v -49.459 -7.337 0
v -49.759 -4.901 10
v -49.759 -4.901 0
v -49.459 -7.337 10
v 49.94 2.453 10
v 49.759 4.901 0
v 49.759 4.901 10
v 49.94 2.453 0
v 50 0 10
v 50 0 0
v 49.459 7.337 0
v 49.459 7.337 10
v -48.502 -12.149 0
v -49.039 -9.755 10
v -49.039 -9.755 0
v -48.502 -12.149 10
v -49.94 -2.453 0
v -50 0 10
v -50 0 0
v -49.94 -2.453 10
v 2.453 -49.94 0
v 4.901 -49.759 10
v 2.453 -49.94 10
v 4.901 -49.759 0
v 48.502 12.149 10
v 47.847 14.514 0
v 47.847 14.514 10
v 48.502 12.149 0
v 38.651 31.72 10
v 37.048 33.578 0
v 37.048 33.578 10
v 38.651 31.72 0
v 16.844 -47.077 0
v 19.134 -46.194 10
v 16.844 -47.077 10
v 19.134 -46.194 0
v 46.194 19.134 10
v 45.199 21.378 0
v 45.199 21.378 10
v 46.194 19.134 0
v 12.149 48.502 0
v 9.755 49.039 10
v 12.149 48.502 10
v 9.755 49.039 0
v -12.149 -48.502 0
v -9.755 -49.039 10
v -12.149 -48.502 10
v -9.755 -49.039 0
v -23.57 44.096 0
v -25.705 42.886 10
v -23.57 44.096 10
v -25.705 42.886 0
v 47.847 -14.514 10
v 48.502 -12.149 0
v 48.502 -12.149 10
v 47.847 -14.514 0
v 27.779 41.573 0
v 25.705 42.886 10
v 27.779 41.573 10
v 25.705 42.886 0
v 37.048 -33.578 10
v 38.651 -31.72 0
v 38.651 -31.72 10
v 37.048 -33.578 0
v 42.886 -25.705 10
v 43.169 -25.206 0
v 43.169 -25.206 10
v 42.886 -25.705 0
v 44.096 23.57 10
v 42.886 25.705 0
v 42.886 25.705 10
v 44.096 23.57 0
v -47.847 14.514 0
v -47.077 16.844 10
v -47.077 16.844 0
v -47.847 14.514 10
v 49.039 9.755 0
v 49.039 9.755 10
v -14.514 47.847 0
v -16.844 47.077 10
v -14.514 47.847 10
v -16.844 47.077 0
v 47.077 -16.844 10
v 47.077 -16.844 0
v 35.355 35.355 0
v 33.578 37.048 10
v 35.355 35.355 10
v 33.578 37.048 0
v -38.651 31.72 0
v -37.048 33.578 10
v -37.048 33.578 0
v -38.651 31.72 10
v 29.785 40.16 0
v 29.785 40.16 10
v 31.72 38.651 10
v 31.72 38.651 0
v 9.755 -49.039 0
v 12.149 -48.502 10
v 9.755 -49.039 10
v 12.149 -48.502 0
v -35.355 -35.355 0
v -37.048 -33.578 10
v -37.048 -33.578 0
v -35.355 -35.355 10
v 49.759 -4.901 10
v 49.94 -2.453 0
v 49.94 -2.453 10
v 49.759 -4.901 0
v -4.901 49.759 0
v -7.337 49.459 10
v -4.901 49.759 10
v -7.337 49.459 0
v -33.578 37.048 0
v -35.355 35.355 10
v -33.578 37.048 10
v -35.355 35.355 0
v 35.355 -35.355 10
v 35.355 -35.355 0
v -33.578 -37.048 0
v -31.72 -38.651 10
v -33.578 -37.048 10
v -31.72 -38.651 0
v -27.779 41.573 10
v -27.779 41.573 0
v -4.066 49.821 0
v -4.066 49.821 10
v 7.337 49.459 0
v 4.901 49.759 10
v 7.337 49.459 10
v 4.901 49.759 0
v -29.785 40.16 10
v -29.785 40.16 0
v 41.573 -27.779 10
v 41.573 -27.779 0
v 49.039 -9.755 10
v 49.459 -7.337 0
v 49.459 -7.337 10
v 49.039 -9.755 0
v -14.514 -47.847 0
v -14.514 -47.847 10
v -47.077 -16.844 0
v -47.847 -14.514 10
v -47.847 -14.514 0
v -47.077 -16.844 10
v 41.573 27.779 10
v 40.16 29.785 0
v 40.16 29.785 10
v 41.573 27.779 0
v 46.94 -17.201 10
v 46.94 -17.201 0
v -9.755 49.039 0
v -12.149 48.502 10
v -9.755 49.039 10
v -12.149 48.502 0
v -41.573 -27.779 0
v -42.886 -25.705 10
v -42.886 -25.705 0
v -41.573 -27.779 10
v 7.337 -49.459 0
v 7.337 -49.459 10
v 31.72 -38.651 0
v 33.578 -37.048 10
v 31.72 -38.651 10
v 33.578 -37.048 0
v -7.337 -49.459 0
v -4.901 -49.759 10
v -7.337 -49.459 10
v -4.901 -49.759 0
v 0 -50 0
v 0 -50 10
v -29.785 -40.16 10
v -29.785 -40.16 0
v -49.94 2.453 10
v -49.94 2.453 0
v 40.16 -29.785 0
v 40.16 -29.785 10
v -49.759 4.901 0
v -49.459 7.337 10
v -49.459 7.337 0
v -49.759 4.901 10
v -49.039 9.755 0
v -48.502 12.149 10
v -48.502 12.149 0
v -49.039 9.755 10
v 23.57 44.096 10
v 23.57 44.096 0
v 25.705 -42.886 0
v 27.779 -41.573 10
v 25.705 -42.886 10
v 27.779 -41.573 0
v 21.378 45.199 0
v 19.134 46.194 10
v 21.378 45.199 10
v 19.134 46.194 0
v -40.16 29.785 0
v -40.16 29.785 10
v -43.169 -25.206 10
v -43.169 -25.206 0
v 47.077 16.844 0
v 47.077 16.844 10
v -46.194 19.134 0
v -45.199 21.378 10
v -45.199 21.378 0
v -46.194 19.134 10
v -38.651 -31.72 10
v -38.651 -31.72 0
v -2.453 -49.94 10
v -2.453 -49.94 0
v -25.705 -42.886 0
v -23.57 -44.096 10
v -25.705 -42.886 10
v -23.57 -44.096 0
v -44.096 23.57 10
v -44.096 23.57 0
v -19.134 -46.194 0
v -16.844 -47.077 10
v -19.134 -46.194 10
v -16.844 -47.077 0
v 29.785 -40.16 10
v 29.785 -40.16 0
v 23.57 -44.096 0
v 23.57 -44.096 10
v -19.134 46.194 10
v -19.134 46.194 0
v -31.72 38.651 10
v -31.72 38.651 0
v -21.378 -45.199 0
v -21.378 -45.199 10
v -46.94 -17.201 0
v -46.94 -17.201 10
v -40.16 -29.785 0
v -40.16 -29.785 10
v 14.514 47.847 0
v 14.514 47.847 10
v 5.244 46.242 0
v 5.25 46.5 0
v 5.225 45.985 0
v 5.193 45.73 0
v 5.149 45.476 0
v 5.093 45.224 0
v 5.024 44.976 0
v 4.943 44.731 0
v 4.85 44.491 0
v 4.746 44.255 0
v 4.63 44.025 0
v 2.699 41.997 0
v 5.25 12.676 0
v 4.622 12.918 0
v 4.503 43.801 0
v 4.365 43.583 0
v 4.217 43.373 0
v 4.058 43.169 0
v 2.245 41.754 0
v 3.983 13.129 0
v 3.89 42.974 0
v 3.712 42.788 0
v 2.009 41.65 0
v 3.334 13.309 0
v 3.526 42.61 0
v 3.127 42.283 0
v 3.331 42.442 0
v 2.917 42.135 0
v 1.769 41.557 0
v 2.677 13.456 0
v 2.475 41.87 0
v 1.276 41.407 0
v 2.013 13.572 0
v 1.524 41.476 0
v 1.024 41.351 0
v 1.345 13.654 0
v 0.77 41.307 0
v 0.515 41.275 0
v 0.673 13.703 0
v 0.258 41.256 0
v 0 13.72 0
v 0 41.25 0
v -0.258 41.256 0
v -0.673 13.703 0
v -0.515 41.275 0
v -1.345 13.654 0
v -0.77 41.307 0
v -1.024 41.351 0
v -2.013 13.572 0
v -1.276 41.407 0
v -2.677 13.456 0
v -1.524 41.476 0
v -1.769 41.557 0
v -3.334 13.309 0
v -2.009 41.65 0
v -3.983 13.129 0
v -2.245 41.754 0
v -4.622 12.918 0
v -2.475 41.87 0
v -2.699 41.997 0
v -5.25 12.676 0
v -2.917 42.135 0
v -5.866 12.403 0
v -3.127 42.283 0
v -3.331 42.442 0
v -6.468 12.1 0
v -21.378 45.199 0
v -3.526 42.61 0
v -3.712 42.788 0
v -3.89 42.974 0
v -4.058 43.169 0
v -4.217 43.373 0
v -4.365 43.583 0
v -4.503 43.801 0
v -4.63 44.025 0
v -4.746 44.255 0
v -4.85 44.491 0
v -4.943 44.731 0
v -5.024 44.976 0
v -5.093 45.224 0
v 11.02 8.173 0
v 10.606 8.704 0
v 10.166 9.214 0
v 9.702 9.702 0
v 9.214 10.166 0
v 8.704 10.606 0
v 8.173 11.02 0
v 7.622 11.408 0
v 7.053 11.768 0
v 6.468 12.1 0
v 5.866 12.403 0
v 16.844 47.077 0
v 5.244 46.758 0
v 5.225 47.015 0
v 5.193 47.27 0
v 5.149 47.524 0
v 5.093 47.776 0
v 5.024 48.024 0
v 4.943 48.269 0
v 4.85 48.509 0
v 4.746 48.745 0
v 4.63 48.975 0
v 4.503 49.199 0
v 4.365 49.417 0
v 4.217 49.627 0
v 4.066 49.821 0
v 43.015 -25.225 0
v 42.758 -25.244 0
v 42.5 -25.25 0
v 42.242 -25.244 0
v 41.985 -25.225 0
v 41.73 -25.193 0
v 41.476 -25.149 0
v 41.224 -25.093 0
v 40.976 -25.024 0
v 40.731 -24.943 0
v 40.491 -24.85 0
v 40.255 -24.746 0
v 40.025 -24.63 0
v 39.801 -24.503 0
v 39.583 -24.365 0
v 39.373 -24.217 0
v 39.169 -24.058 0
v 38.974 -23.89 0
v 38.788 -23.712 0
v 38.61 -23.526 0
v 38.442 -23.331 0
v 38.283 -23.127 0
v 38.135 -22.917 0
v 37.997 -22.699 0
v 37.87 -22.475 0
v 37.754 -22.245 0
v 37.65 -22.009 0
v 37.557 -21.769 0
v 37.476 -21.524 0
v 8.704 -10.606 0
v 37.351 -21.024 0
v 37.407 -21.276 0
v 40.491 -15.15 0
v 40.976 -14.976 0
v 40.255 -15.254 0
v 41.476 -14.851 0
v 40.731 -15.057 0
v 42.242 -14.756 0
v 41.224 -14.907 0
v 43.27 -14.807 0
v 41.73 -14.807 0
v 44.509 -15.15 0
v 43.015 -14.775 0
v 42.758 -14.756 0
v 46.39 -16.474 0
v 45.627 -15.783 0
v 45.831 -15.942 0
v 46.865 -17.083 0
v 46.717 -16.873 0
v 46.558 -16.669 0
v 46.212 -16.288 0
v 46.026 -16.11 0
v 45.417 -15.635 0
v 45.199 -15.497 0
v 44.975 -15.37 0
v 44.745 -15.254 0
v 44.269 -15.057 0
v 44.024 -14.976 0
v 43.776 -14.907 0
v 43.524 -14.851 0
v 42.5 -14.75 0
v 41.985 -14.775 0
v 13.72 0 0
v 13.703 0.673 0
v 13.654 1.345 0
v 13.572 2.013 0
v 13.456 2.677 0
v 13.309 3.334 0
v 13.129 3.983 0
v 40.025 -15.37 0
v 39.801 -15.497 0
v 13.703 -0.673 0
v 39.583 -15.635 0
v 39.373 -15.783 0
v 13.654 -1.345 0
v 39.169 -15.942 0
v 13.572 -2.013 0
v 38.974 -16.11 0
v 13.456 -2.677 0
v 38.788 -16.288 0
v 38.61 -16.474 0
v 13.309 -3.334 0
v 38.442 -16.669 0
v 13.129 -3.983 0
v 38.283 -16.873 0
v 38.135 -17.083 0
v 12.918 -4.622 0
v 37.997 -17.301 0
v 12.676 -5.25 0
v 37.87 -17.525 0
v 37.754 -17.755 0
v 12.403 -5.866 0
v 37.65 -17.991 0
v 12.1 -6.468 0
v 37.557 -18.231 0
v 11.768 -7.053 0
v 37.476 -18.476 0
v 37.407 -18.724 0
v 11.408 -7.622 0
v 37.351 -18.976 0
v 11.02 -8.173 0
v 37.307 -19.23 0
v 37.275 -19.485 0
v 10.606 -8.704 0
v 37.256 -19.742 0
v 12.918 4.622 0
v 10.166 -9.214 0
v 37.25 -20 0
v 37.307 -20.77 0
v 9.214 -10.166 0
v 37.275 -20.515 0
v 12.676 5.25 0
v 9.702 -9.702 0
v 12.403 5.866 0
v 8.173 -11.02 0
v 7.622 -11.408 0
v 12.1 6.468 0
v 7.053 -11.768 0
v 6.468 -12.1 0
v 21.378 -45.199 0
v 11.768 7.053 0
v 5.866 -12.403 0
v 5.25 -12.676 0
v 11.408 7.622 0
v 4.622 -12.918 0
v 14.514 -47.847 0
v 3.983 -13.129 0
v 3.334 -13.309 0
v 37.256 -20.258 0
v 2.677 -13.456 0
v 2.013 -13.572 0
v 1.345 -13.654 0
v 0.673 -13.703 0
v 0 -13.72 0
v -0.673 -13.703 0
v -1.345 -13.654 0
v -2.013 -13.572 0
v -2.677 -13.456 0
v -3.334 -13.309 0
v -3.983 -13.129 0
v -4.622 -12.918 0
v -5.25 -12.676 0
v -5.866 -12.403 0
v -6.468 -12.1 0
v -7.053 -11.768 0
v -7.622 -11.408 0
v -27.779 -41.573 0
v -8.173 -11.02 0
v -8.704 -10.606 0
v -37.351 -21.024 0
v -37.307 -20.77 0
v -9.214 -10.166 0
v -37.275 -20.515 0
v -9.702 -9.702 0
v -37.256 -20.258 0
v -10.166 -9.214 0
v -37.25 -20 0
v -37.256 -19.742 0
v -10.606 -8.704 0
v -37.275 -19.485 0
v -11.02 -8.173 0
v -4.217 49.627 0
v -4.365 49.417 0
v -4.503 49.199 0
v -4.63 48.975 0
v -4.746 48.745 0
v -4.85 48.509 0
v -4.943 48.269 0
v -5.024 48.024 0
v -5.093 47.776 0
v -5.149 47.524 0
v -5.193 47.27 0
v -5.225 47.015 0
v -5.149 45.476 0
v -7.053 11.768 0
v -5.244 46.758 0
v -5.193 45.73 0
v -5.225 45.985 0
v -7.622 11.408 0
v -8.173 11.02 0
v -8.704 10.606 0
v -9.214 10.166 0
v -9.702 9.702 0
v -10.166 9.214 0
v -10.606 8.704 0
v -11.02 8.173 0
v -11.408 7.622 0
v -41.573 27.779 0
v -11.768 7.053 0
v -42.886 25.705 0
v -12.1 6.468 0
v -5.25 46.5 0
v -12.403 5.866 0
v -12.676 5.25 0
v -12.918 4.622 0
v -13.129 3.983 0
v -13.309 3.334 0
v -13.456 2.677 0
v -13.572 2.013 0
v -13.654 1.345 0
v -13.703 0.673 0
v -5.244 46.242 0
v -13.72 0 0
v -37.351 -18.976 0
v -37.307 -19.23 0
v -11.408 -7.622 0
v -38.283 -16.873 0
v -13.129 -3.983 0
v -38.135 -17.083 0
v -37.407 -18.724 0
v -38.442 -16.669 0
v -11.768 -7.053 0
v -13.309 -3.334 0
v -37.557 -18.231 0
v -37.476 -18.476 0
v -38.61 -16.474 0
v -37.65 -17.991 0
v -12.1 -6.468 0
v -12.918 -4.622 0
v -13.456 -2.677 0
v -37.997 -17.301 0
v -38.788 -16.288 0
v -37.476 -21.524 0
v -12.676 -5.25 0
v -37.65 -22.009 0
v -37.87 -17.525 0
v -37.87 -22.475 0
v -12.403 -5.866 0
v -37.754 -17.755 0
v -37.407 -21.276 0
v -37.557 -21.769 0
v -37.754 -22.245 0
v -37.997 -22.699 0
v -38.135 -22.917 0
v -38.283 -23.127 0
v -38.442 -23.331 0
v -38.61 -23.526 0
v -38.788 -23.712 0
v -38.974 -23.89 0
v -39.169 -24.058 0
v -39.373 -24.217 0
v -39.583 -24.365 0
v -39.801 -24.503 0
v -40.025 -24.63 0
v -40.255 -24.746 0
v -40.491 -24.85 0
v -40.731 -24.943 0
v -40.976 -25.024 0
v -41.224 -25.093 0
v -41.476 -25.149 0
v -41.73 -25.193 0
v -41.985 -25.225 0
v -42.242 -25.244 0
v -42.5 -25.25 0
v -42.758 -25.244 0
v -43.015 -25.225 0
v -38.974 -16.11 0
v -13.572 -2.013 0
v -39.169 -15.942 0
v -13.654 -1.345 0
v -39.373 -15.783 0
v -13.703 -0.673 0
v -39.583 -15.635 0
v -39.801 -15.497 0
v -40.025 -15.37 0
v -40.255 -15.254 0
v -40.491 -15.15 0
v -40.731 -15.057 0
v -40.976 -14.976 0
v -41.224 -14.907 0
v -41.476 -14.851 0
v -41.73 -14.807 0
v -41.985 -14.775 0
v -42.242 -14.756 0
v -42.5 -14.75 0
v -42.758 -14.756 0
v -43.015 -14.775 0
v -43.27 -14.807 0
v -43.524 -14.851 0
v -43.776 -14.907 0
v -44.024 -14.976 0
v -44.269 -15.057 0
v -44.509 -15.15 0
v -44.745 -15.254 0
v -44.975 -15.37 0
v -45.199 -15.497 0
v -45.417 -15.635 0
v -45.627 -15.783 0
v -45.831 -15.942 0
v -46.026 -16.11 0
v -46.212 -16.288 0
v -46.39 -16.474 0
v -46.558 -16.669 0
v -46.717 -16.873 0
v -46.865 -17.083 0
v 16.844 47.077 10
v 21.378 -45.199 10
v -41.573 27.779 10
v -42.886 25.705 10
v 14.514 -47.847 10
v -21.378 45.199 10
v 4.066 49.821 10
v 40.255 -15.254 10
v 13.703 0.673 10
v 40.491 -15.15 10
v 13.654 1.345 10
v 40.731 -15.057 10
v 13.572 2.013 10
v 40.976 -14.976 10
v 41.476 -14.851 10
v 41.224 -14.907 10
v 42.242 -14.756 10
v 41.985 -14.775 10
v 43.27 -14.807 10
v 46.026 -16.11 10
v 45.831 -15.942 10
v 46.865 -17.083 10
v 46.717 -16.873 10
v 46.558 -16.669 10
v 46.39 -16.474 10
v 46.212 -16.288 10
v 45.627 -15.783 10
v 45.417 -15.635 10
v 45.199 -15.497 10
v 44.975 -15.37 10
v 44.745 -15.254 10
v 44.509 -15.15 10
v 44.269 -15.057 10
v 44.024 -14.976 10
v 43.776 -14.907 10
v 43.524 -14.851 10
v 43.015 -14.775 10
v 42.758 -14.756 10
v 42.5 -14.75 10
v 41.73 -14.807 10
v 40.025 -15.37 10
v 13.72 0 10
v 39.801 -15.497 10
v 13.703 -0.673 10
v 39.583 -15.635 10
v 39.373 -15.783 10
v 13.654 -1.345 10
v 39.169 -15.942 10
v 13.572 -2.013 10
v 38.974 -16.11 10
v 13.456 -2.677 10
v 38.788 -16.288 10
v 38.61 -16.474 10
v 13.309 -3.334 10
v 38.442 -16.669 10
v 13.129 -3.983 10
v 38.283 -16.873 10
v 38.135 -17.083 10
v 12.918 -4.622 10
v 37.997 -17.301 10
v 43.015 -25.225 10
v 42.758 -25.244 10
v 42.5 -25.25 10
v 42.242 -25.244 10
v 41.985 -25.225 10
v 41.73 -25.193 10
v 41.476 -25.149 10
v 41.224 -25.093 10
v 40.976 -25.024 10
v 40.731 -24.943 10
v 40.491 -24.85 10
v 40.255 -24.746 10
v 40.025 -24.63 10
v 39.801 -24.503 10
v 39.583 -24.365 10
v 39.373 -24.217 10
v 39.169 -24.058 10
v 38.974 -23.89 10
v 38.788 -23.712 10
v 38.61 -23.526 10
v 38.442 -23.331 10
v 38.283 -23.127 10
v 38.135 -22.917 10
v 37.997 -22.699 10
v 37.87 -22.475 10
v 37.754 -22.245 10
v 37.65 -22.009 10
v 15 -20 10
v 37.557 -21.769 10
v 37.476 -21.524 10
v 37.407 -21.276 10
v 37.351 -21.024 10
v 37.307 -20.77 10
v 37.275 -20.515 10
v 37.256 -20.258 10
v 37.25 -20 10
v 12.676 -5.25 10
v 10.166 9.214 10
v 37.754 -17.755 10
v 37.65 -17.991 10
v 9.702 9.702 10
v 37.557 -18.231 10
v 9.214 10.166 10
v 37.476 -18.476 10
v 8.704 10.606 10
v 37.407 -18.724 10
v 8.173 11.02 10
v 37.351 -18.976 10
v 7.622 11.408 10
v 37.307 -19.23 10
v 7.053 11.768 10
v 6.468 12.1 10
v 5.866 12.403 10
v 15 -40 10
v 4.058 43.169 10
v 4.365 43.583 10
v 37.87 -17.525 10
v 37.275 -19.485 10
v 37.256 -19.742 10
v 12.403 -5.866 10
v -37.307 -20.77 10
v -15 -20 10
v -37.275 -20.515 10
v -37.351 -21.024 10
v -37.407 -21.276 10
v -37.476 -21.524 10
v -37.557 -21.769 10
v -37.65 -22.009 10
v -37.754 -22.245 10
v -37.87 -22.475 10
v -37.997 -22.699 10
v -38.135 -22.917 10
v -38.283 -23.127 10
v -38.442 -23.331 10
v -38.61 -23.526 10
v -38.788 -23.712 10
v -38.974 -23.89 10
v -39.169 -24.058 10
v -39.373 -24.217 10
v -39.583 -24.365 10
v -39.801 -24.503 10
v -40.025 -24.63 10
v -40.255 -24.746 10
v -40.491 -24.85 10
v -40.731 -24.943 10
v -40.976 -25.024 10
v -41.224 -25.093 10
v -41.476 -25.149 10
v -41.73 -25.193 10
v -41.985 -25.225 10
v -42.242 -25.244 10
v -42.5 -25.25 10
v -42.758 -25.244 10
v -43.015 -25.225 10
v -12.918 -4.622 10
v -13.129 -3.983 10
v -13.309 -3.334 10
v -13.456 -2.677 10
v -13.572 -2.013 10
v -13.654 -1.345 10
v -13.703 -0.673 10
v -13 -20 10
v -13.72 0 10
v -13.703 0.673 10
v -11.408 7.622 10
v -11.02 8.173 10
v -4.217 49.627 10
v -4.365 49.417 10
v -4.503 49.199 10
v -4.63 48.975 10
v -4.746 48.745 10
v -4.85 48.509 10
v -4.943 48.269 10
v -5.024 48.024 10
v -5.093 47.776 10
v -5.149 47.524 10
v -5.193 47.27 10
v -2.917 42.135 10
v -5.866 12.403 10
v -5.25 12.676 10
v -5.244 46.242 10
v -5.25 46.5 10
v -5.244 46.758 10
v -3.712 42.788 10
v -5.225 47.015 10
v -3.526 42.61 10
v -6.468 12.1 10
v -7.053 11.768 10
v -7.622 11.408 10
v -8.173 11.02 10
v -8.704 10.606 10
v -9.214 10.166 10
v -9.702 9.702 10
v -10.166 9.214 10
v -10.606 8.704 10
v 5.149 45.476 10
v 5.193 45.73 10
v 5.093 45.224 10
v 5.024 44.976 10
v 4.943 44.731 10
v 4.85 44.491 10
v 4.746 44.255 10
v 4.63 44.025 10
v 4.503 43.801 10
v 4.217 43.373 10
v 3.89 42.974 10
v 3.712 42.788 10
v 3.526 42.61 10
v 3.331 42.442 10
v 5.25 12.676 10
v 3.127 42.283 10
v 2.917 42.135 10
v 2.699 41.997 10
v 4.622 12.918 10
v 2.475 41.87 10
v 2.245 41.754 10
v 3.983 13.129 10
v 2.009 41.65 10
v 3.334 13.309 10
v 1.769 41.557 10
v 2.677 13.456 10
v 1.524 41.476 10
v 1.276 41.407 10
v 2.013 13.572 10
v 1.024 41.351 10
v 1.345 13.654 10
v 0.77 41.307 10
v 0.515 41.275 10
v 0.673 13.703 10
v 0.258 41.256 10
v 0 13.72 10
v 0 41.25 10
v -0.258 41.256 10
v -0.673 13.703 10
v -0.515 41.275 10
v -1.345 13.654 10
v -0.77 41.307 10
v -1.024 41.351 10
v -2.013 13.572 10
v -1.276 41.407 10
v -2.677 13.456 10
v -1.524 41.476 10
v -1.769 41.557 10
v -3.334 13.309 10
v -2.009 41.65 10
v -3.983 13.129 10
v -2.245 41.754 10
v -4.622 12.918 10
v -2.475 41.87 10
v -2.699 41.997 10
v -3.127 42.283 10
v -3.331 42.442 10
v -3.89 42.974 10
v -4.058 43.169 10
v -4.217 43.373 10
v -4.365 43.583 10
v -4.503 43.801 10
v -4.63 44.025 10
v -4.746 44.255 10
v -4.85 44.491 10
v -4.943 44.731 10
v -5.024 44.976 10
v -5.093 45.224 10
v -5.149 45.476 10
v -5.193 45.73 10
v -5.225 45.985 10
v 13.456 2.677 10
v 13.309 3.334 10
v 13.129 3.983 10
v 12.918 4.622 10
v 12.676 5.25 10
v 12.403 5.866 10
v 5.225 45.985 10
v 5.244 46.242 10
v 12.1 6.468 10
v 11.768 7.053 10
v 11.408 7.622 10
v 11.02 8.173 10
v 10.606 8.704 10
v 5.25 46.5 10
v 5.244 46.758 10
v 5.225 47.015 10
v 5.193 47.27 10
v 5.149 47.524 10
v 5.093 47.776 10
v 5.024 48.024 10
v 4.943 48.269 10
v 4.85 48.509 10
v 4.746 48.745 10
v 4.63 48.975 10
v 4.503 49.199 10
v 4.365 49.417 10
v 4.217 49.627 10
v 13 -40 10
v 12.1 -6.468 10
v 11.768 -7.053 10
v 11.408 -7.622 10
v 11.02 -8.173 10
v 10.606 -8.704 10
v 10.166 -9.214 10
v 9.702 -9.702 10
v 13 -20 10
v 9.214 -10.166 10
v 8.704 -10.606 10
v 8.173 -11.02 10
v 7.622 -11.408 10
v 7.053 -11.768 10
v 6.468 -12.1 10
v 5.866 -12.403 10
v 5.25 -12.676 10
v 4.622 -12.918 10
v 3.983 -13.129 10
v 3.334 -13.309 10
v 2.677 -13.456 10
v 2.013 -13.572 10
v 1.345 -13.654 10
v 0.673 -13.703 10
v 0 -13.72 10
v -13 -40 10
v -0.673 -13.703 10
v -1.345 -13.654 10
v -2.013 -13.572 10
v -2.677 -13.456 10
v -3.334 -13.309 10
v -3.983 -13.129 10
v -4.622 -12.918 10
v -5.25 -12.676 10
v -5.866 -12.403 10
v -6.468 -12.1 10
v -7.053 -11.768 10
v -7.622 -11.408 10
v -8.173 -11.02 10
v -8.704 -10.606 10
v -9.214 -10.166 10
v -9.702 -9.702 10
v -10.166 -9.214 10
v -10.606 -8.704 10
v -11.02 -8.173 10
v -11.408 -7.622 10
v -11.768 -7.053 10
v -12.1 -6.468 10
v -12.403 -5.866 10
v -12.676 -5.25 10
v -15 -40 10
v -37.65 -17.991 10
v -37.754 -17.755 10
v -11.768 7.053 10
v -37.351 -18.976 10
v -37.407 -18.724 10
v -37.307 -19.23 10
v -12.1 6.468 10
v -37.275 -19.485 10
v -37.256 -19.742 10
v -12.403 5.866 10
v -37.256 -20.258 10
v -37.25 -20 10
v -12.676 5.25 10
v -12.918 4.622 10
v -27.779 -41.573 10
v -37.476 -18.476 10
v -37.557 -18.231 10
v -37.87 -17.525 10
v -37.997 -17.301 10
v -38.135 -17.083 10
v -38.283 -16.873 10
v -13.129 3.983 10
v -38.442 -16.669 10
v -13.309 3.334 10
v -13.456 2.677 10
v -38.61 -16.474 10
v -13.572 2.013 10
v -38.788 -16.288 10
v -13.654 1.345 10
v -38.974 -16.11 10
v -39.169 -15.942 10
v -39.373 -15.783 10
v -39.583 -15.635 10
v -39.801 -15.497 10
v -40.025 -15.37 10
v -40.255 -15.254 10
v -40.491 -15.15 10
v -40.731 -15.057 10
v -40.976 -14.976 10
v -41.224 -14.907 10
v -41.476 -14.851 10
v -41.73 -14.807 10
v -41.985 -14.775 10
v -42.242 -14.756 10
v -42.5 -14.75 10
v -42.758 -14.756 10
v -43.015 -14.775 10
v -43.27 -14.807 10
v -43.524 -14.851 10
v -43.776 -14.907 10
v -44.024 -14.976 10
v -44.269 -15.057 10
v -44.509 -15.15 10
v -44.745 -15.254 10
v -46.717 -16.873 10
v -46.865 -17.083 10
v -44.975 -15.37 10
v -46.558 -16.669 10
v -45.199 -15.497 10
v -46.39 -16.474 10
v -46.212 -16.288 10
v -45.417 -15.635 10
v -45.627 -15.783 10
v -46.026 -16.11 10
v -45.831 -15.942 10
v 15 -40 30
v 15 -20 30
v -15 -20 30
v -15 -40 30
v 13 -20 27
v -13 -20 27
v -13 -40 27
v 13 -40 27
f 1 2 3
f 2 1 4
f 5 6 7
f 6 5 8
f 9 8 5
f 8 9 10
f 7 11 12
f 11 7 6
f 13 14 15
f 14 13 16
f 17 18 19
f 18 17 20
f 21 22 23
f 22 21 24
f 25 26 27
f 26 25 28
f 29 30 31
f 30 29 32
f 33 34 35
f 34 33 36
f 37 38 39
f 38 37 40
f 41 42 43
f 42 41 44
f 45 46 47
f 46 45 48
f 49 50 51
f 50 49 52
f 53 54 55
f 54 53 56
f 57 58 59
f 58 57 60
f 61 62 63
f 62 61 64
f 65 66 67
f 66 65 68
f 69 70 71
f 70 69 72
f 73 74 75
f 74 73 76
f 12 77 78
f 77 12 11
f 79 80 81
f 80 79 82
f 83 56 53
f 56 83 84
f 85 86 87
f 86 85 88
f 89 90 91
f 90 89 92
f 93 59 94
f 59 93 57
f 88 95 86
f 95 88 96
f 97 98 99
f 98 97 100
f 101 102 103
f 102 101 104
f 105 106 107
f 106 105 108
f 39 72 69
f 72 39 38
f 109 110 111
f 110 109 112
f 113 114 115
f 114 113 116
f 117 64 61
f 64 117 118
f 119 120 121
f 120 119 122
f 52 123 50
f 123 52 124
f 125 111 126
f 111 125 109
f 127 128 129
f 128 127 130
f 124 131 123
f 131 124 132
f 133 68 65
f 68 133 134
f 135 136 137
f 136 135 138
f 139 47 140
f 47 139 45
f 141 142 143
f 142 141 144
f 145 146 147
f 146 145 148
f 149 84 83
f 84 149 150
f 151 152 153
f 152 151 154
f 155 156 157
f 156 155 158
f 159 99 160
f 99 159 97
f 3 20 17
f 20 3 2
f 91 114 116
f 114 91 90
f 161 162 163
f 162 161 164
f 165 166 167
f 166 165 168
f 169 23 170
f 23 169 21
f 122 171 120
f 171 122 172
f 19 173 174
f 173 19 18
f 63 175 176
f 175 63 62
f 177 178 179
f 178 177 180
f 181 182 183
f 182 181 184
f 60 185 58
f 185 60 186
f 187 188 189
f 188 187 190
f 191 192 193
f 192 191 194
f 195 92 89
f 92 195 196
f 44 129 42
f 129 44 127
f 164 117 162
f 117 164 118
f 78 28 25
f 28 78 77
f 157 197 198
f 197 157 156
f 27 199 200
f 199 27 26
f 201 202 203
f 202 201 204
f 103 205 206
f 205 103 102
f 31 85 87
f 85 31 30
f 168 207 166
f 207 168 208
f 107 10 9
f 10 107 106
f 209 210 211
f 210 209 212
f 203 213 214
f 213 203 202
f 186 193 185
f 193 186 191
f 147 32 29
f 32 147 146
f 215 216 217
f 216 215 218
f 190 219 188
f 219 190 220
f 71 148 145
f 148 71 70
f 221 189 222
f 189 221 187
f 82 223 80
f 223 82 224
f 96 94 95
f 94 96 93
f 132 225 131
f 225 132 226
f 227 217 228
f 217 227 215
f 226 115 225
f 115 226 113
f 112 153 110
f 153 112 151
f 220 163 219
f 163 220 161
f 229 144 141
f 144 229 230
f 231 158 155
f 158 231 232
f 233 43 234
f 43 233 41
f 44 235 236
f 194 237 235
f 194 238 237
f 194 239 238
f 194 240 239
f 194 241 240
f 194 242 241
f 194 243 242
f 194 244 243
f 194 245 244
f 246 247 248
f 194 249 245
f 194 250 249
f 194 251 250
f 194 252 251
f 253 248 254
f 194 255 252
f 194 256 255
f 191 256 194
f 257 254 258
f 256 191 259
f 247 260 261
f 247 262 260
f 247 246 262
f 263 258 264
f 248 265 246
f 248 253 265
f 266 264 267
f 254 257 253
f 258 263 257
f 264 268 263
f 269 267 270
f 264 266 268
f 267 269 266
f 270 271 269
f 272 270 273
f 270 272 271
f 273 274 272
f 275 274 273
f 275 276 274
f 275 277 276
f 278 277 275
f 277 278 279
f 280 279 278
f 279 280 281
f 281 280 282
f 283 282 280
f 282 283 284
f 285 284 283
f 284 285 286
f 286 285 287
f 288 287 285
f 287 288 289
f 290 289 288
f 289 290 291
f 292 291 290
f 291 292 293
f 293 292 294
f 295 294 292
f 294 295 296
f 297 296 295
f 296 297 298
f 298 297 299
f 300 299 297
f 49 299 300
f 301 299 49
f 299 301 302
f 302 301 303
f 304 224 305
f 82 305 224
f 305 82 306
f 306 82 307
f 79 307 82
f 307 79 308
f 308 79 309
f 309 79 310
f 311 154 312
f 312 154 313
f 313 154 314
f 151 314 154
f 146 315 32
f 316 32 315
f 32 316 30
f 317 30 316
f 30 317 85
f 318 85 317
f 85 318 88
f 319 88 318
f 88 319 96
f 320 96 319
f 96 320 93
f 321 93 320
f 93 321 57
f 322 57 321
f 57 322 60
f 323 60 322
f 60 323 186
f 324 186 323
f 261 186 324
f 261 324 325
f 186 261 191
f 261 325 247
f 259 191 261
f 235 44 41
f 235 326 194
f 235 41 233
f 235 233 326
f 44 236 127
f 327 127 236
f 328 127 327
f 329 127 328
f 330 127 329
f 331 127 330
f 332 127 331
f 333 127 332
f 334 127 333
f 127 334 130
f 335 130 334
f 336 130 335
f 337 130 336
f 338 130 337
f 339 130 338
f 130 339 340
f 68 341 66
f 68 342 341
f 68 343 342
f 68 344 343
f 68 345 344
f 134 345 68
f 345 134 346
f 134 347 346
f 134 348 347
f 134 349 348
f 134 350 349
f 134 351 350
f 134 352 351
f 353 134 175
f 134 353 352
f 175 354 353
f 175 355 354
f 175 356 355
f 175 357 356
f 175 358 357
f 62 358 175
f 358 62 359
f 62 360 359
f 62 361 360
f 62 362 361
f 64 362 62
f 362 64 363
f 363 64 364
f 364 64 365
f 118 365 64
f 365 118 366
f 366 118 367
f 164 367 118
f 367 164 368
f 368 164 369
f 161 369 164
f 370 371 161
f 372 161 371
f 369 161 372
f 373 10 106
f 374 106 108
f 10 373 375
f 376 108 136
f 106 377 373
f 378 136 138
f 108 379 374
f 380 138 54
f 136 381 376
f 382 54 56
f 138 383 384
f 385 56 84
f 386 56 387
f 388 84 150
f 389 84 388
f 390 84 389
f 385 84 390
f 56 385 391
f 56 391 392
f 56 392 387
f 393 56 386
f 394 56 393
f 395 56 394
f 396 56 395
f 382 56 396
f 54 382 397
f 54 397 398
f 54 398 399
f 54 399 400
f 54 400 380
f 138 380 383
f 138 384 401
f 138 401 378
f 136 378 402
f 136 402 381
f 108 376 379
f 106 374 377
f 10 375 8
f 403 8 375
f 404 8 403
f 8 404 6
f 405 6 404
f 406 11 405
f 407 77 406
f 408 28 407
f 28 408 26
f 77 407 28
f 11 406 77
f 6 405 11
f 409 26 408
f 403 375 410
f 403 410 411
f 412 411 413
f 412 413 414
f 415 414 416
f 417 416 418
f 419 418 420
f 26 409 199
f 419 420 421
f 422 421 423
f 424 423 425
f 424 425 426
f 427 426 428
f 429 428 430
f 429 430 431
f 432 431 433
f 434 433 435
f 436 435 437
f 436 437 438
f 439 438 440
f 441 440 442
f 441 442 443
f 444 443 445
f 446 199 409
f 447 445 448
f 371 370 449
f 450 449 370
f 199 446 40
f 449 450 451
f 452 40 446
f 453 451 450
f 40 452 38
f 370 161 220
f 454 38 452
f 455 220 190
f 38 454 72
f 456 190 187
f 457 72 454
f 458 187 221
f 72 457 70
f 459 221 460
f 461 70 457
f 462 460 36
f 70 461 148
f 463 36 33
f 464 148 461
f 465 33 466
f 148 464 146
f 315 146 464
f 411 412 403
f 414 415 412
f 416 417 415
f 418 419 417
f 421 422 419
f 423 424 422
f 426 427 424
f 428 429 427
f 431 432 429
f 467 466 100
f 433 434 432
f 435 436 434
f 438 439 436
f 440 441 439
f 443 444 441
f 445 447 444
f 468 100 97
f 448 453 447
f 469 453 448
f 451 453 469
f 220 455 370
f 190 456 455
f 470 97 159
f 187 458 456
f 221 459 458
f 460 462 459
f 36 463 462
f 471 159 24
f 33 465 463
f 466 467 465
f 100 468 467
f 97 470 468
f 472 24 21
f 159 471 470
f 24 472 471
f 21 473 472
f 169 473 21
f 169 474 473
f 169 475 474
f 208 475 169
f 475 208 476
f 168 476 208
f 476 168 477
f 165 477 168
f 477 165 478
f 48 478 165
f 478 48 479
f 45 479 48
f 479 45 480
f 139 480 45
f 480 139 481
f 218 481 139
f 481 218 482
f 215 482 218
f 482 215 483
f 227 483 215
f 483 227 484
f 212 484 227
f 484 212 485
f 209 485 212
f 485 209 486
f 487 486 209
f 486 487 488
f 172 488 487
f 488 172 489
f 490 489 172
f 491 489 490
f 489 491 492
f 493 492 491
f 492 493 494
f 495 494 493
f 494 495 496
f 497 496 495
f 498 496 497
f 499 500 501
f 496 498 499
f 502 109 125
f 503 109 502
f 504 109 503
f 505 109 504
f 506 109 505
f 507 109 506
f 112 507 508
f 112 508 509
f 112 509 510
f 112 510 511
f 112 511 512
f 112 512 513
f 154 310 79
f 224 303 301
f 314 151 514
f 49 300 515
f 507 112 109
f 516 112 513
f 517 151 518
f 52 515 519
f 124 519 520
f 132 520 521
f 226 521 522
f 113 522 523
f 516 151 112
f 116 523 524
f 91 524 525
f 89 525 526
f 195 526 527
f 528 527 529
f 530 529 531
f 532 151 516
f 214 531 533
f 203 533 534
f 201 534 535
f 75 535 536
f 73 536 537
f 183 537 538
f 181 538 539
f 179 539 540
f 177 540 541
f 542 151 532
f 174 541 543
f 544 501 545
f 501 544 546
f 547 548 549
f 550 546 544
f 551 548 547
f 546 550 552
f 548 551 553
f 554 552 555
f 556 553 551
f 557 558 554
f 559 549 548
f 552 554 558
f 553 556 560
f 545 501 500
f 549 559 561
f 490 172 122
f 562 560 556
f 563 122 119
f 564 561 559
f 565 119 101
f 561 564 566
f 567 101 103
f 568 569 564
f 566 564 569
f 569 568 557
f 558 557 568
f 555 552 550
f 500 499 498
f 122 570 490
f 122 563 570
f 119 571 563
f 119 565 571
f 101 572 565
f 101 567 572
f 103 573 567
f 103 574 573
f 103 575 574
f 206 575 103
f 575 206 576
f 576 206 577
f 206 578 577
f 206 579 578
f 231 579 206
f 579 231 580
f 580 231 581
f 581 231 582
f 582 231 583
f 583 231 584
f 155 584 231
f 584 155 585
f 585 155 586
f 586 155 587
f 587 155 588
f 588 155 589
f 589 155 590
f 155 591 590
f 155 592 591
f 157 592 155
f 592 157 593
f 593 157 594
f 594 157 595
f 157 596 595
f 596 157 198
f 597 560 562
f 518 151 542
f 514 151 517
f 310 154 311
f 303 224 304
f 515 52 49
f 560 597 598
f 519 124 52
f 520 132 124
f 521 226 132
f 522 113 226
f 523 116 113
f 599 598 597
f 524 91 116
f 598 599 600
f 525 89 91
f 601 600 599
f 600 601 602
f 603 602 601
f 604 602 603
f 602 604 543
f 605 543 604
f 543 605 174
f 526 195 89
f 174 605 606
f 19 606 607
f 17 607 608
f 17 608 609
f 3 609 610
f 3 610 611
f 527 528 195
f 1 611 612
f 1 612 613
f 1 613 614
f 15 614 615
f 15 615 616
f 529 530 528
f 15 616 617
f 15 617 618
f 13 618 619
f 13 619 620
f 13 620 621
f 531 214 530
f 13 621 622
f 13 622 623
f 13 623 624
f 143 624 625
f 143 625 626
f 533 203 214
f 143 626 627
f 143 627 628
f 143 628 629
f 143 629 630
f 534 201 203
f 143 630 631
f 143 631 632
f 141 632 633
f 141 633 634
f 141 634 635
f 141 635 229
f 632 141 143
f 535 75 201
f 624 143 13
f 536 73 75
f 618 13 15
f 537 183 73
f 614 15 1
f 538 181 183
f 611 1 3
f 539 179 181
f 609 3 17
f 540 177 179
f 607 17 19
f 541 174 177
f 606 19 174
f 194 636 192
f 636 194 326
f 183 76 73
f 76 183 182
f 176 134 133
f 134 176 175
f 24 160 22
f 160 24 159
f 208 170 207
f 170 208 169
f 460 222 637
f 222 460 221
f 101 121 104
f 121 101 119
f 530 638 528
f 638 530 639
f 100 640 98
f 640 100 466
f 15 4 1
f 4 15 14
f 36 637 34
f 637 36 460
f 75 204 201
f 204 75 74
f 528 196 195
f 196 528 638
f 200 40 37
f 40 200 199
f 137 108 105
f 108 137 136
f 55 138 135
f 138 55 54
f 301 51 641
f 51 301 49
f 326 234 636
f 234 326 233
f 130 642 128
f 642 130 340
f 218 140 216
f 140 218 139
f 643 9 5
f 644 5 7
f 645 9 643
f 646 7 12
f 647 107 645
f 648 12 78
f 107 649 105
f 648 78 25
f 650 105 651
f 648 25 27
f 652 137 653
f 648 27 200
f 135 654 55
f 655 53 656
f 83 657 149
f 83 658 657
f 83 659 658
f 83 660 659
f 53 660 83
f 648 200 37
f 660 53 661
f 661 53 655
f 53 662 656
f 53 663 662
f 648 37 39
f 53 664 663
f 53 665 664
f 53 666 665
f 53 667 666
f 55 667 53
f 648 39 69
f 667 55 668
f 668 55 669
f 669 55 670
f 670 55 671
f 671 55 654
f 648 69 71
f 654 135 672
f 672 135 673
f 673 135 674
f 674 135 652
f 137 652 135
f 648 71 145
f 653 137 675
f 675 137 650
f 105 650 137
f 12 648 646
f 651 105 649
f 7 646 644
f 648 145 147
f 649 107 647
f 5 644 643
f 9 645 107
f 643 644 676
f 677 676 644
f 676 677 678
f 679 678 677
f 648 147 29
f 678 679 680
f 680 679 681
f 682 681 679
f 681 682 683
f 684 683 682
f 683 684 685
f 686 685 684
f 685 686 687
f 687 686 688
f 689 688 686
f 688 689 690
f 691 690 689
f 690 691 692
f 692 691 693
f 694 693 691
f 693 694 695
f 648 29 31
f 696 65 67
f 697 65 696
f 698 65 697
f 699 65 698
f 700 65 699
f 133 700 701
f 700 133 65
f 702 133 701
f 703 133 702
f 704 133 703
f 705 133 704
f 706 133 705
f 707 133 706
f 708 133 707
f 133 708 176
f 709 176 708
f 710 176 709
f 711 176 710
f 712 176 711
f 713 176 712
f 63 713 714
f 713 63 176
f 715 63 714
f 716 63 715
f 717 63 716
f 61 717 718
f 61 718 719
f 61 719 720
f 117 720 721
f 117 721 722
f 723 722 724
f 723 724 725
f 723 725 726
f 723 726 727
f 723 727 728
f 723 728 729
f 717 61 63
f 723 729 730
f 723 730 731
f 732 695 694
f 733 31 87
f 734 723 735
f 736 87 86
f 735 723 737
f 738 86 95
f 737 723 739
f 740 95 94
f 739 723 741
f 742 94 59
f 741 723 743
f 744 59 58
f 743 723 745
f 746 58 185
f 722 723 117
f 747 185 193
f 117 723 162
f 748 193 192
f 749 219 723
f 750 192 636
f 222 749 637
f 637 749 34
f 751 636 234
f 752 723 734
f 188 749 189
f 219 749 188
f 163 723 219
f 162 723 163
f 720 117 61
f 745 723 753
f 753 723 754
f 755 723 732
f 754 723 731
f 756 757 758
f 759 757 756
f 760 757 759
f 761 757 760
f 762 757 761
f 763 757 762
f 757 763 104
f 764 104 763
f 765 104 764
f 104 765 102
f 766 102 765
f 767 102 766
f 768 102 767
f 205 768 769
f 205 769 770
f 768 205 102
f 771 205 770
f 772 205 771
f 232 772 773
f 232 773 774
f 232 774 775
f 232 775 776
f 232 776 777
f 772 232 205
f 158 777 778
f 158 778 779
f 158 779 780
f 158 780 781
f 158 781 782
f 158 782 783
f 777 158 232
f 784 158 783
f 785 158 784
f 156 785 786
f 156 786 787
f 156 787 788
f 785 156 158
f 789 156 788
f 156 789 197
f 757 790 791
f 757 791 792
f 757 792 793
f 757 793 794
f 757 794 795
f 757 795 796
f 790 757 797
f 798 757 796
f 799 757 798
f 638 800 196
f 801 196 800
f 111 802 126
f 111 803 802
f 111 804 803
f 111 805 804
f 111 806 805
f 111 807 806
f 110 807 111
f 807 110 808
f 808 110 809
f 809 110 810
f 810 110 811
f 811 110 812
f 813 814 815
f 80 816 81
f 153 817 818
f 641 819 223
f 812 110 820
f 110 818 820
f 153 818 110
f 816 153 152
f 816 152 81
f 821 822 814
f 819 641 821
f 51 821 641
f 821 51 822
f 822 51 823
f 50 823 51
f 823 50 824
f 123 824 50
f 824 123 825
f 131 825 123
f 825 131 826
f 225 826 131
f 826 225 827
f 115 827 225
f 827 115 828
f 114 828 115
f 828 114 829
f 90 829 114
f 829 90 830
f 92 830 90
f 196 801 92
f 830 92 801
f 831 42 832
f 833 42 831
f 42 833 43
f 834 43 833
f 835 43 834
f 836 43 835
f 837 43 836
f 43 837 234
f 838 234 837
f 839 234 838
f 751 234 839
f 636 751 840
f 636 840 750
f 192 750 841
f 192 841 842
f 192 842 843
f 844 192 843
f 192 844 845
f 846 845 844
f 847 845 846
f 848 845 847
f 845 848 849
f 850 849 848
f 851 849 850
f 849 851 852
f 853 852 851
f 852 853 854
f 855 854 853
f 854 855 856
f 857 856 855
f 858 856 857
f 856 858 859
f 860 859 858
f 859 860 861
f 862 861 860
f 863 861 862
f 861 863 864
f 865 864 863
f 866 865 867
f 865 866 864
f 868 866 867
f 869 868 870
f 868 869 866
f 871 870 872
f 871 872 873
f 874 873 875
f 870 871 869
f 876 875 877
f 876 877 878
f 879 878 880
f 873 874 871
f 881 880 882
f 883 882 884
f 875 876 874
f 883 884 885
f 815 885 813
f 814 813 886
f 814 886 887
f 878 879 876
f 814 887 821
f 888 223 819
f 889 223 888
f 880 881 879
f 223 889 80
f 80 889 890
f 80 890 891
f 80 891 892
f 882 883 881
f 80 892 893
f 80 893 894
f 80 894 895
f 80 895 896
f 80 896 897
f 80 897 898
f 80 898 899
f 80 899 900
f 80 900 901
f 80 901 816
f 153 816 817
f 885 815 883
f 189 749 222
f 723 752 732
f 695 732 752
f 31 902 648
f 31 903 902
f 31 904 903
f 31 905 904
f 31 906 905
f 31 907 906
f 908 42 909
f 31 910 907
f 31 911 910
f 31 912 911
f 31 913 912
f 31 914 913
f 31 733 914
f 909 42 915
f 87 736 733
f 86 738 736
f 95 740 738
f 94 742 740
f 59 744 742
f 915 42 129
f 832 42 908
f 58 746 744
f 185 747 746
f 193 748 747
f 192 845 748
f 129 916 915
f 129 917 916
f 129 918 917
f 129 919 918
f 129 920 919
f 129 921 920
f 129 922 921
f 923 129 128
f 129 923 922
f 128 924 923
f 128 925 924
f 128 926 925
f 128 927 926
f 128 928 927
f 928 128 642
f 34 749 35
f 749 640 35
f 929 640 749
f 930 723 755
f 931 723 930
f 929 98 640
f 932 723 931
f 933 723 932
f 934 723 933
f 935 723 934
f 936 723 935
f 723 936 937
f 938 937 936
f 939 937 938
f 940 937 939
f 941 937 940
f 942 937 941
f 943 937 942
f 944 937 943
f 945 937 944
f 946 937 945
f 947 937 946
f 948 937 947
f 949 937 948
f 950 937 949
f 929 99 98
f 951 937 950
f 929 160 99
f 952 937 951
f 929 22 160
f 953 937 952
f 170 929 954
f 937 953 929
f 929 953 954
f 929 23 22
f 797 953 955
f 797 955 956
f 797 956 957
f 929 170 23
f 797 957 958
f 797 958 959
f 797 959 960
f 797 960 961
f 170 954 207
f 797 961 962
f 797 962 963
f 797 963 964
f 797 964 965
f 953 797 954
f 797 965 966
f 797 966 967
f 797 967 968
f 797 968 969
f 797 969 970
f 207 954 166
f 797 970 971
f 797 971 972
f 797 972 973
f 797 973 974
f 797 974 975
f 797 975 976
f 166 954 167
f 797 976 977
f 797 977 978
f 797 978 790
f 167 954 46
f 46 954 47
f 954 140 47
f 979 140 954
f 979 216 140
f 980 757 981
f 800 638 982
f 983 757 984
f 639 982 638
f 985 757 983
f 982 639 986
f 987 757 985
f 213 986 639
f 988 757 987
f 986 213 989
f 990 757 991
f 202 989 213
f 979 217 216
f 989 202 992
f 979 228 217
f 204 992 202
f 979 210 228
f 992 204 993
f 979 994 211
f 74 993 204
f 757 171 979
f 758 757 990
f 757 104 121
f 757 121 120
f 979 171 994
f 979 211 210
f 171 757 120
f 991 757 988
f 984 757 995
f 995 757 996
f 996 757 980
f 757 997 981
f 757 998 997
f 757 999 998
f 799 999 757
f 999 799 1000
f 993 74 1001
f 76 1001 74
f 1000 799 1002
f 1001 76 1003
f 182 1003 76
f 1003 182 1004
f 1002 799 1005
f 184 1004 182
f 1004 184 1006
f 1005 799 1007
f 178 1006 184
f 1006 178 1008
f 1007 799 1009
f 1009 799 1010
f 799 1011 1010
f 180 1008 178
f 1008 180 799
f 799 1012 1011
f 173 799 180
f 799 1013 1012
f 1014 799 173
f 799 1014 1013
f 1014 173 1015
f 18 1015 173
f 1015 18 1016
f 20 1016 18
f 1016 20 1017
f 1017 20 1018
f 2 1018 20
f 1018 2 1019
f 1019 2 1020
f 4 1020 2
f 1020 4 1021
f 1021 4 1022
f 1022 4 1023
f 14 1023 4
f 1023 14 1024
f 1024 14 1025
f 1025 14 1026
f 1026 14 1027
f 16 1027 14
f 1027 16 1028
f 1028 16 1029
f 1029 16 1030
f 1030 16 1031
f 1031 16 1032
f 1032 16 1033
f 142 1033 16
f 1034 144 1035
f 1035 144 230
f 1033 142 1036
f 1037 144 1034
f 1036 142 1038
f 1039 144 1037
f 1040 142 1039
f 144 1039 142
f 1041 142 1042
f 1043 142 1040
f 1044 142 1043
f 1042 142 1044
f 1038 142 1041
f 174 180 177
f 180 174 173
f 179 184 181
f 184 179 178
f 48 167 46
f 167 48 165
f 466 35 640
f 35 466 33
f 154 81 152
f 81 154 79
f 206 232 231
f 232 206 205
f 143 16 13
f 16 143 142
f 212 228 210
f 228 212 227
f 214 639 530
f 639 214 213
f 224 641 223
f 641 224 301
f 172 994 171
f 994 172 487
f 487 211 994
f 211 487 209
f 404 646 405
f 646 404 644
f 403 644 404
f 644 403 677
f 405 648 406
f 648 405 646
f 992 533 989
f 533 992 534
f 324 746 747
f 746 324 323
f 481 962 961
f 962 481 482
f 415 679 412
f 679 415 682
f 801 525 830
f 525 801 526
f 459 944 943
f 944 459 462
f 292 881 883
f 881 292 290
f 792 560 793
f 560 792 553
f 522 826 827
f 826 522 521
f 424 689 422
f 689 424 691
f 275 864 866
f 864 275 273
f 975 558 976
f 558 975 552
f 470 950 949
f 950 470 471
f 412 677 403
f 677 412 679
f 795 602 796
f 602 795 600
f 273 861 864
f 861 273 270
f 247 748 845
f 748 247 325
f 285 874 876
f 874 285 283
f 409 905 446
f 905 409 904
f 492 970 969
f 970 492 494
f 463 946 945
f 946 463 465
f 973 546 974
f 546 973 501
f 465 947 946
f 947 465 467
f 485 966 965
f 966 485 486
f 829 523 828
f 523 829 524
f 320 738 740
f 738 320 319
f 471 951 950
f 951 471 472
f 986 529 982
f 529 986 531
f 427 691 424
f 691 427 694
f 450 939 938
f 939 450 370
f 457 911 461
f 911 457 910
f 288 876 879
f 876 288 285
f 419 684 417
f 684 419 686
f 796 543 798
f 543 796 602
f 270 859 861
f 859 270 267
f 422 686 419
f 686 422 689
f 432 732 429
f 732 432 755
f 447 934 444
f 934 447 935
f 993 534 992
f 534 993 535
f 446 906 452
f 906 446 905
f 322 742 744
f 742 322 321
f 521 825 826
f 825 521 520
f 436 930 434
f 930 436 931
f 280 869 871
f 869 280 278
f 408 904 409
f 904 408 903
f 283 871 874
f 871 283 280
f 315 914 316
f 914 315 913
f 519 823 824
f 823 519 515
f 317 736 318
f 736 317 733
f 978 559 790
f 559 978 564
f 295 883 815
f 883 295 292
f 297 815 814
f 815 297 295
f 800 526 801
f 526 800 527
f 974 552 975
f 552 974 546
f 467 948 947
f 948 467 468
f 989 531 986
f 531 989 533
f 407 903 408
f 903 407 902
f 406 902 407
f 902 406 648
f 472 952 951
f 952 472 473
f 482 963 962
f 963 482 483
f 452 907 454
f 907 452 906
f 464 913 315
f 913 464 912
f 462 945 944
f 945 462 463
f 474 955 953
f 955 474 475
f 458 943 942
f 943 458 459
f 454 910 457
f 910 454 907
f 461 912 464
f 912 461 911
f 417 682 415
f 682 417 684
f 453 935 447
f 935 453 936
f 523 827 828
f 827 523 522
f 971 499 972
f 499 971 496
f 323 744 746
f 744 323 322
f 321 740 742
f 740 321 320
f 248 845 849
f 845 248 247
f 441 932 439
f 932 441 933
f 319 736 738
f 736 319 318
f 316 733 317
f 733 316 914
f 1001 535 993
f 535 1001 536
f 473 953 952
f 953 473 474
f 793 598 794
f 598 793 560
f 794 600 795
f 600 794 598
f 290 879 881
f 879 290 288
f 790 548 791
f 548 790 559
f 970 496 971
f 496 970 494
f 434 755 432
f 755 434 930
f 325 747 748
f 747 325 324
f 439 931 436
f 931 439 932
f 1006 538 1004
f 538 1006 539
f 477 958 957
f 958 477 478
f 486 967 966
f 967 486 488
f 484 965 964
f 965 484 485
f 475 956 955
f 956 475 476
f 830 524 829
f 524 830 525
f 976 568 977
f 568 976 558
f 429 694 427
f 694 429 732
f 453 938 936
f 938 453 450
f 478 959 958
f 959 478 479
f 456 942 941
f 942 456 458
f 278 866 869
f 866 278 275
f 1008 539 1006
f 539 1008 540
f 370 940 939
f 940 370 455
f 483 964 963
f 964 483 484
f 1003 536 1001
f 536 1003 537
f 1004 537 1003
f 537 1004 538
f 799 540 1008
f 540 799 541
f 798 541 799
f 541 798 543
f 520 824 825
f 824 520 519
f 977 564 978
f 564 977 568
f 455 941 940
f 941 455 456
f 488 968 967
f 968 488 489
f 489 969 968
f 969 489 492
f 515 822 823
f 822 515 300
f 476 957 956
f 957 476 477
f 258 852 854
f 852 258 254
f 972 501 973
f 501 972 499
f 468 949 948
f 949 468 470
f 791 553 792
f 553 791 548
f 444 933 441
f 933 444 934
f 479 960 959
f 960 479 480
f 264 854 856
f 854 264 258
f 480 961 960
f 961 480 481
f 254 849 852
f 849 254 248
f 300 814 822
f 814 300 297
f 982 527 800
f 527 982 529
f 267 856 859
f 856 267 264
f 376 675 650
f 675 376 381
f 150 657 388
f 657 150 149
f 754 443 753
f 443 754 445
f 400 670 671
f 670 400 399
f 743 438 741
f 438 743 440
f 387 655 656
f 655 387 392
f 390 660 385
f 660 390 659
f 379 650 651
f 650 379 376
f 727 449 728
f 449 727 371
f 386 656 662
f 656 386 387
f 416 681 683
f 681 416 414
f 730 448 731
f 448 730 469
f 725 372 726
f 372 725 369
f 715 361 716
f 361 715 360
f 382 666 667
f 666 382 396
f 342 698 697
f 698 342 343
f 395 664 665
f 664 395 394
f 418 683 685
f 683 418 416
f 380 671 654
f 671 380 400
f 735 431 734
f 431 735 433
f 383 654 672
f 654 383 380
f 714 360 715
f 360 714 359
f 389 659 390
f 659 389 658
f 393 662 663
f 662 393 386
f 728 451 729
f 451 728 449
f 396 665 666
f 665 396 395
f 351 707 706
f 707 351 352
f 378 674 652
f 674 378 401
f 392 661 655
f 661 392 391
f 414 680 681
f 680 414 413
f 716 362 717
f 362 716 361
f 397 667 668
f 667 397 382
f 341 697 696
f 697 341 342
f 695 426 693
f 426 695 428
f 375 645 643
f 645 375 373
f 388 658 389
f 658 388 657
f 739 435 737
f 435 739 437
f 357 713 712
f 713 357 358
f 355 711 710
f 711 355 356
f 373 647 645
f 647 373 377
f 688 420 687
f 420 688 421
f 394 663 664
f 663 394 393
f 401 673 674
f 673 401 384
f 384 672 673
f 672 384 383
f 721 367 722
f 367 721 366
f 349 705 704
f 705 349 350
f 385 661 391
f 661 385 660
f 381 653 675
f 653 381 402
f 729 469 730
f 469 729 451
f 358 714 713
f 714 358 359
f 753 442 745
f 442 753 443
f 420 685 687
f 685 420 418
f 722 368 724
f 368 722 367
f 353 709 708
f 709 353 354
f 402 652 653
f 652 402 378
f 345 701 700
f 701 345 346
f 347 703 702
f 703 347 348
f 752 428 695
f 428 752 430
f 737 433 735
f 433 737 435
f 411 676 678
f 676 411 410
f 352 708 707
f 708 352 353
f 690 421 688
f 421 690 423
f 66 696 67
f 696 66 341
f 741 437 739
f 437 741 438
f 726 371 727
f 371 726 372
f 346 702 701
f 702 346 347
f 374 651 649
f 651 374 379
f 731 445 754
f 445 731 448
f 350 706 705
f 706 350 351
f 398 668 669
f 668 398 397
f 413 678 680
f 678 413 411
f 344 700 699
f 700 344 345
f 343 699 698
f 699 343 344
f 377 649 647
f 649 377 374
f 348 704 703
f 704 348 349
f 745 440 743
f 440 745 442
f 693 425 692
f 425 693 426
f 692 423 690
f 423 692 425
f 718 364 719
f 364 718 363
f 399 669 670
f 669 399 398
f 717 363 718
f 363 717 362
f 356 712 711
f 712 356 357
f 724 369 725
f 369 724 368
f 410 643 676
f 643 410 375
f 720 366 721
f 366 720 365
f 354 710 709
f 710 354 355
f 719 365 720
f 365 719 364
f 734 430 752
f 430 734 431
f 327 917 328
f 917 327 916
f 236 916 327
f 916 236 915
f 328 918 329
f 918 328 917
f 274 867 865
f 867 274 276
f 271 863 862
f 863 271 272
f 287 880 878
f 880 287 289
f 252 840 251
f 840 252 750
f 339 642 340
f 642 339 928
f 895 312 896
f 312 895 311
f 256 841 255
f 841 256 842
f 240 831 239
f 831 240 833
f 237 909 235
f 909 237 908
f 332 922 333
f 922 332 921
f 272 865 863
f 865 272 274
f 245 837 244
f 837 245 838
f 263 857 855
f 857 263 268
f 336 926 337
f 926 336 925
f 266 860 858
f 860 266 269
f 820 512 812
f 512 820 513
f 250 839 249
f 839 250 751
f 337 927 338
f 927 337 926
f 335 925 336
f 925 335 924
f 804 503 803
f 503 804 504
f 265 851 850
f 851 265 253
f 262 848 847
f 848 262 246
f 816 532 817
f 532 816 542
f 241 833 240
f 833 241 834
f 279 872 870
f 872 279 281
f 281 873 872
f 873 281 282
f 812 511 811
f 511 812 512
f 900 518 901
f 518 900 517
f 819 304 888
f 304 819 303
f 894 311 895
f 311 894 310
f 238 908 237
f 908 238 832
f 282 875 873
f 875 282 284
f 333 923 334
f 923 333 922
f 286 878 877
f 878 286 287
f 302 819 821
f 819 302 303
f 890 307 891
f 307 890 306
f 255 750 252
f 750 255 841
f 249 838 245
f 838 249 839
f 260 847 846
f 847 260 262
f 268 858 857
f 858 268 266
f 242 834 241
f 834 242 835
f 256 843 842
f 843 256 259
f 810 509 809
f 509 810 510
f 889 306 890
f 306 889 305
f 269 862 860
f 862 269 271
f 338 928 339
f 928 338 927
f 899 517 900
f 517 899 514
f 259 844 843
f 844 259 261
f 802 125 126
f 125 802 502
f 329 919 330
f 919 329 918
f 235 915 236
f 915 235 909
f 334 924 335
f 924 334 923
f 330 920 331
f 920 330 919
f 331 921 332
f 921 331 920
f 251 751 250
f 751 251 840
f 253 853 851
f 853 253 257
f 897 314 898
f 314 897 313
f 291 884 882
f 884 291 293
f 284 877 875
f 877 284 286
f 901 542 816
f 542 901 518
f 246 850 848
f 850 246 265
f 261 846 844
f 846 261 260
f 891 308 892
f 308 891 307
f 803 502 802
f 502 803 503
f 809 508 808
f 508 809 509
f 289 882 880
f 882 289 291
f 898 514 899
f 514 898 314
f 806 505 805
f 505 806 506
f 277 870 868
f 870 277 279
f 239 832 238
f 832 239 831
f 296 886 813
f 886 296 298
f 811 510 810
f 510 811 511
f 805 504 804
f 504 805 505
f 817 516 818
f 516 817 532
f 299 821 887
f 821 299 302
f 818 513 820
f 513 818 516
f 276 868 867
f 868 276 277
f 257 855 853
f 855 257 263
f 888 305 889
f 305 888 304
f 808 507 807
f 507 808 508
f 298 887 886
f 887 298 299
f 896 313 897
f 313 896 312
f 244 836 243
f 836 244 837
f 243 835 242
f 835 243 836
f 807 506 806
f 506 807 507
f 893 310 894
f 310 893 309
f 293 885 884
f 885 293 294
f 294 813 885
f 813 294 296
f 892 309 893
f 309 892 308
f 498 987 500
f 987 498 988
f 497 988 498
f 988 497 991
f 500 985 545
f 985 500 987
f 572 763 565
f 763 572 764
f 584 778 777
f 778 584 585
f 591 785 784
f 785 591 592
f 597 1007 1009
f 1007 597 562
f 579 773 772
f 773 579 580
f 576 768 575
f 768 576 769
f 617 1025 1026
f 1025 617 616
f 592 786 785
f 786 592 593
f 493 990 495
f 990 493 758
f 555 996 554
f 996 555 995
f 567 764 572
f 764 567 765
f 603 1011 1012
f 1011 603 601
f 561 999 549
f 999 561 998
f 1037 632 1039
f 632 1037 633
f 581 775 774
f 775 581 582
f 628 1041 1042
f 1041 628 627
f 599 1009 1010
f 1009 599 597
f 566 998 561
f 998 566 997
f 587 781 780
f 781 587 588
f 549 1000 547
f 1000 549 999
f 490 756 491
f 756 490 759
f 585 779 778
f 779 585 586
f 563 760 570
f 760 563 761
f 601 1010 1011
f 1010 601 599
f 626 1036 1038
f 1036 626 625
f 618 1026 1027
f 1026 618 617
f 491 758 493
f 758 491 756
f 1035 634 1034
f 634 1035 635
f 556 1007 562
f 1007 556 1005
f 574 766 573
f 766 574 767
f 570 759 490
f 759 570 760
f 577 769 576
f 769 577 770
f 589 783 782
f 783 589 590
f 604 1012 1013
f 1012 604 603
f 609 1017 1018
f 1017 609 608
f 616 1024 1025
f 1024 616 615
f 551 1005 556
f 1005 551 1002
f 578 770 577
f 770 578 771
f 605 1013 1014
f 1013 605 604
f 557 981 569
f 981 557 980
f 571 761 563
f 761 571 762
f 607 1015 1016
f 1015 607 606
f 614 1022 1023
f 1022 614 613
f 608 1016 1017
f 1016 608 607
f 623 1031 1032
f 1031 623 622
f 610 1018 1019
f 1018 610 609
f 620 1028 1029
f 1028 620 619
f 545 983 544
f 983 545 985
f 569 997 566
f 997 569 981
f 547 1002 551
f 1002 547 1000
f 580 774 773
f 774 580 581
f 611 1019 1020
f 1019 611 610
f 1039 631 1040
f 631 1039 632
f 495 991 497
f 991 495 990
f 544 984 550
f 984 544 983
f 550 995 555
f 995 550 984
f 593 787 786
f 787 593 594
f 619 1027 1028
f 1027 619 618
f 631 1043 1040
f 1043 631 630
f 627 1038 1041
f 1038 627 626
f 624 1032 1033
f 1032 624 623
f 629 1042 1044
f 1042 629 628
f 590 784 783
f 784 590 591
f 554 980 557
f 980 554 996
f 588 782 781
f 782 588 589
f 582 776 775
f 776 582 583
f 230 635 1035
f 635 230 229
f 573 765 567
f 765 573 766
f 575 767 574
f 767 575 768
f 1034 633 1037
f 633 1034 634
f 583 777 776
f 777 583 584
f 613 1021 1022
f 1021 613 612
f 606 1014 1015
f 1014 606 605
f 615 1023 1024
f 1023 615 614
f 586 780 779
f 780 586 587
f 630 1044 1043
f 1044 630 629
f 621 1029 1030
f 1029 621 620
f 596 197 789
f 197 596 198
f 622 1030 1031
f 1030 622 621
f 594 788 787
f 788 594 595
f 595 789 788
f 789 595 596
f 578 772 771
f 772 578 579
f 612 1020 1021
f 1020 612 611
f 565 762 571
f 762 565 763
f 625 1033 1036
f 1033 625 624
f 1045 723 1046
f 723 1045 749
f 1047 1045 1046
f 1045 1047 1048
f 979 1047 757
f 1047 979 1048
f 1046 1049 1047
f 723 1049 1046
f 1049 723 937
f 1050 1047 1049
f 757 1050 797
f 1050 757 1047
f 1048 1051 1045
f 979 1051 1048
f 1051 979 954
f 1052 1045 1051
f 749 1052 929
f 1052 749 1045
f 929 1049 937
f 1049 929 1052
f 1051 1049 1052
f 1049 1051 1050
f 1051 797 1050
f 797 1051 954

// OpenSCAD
// openscad = http://www.openscad.org/downloads.html

$2d = 0;  // Openscad directions:
          // set this to "$2d = 1;" to get a profile for a dxf
          // then go to menu option "Design" and choose
          // "Compile and Render" then when you get the flat
          // drawing, go to "Design" and choose export as dxf
          // or set "$2d = 0"; and "Export as STL"

// Conveniences:
$inch = 25.4;
$half = $inch/2;
$quarter = $inch/4;
$eigth = $inch/8;
$sixteenth = $inch/16;
$thirtysecondth = $inch/32;

$height=10;
$main_radius=50;
$pen_radius = 10.5/2;

$offset = $main_radius-$pen_radius/1.5;
$motor_radius = 27.44/2;

$fn=128;

module make_parts() {
	translate([0,0,0]) {
      union () {
	      difference () {
	         cylinder(r=$main_radius, h=$height);
	         translate([0,0,-1]) {
	            cylinder(r=$motor_radius, $height+2);
	         }
	         translate([$offset-4,-20,-1]) {
	            cylinder(r=$pen_radius, $height+2);
	         }
	         translate([0,$offset,-1]) {
	            cylinder(r=$pen_radius, $height+2);
	         }
	         translate([-$offset+4,-20,-1]) {
	            cylinder(r=$pen_radius, $height+2);
	         }
	      }
         translate([-15,-40,10]) {
	         difference () {
	            cube([30,20,20]);
               translate([(30-26)/2,-1,0]) {
                  cube([26, 22, 17]);
               }
	         }
         }
      }
   }
}


if ($2d) {
    projection(cut=true) {
       translate([0,0,0]) rotate([0,0,0]) {
         make_parts();
       }
    }
} else {
    make_parts();
//  for measuring and calibrating
//    translate([60,40,0]) {
//      cube([20,5,1]);
//    }
}
